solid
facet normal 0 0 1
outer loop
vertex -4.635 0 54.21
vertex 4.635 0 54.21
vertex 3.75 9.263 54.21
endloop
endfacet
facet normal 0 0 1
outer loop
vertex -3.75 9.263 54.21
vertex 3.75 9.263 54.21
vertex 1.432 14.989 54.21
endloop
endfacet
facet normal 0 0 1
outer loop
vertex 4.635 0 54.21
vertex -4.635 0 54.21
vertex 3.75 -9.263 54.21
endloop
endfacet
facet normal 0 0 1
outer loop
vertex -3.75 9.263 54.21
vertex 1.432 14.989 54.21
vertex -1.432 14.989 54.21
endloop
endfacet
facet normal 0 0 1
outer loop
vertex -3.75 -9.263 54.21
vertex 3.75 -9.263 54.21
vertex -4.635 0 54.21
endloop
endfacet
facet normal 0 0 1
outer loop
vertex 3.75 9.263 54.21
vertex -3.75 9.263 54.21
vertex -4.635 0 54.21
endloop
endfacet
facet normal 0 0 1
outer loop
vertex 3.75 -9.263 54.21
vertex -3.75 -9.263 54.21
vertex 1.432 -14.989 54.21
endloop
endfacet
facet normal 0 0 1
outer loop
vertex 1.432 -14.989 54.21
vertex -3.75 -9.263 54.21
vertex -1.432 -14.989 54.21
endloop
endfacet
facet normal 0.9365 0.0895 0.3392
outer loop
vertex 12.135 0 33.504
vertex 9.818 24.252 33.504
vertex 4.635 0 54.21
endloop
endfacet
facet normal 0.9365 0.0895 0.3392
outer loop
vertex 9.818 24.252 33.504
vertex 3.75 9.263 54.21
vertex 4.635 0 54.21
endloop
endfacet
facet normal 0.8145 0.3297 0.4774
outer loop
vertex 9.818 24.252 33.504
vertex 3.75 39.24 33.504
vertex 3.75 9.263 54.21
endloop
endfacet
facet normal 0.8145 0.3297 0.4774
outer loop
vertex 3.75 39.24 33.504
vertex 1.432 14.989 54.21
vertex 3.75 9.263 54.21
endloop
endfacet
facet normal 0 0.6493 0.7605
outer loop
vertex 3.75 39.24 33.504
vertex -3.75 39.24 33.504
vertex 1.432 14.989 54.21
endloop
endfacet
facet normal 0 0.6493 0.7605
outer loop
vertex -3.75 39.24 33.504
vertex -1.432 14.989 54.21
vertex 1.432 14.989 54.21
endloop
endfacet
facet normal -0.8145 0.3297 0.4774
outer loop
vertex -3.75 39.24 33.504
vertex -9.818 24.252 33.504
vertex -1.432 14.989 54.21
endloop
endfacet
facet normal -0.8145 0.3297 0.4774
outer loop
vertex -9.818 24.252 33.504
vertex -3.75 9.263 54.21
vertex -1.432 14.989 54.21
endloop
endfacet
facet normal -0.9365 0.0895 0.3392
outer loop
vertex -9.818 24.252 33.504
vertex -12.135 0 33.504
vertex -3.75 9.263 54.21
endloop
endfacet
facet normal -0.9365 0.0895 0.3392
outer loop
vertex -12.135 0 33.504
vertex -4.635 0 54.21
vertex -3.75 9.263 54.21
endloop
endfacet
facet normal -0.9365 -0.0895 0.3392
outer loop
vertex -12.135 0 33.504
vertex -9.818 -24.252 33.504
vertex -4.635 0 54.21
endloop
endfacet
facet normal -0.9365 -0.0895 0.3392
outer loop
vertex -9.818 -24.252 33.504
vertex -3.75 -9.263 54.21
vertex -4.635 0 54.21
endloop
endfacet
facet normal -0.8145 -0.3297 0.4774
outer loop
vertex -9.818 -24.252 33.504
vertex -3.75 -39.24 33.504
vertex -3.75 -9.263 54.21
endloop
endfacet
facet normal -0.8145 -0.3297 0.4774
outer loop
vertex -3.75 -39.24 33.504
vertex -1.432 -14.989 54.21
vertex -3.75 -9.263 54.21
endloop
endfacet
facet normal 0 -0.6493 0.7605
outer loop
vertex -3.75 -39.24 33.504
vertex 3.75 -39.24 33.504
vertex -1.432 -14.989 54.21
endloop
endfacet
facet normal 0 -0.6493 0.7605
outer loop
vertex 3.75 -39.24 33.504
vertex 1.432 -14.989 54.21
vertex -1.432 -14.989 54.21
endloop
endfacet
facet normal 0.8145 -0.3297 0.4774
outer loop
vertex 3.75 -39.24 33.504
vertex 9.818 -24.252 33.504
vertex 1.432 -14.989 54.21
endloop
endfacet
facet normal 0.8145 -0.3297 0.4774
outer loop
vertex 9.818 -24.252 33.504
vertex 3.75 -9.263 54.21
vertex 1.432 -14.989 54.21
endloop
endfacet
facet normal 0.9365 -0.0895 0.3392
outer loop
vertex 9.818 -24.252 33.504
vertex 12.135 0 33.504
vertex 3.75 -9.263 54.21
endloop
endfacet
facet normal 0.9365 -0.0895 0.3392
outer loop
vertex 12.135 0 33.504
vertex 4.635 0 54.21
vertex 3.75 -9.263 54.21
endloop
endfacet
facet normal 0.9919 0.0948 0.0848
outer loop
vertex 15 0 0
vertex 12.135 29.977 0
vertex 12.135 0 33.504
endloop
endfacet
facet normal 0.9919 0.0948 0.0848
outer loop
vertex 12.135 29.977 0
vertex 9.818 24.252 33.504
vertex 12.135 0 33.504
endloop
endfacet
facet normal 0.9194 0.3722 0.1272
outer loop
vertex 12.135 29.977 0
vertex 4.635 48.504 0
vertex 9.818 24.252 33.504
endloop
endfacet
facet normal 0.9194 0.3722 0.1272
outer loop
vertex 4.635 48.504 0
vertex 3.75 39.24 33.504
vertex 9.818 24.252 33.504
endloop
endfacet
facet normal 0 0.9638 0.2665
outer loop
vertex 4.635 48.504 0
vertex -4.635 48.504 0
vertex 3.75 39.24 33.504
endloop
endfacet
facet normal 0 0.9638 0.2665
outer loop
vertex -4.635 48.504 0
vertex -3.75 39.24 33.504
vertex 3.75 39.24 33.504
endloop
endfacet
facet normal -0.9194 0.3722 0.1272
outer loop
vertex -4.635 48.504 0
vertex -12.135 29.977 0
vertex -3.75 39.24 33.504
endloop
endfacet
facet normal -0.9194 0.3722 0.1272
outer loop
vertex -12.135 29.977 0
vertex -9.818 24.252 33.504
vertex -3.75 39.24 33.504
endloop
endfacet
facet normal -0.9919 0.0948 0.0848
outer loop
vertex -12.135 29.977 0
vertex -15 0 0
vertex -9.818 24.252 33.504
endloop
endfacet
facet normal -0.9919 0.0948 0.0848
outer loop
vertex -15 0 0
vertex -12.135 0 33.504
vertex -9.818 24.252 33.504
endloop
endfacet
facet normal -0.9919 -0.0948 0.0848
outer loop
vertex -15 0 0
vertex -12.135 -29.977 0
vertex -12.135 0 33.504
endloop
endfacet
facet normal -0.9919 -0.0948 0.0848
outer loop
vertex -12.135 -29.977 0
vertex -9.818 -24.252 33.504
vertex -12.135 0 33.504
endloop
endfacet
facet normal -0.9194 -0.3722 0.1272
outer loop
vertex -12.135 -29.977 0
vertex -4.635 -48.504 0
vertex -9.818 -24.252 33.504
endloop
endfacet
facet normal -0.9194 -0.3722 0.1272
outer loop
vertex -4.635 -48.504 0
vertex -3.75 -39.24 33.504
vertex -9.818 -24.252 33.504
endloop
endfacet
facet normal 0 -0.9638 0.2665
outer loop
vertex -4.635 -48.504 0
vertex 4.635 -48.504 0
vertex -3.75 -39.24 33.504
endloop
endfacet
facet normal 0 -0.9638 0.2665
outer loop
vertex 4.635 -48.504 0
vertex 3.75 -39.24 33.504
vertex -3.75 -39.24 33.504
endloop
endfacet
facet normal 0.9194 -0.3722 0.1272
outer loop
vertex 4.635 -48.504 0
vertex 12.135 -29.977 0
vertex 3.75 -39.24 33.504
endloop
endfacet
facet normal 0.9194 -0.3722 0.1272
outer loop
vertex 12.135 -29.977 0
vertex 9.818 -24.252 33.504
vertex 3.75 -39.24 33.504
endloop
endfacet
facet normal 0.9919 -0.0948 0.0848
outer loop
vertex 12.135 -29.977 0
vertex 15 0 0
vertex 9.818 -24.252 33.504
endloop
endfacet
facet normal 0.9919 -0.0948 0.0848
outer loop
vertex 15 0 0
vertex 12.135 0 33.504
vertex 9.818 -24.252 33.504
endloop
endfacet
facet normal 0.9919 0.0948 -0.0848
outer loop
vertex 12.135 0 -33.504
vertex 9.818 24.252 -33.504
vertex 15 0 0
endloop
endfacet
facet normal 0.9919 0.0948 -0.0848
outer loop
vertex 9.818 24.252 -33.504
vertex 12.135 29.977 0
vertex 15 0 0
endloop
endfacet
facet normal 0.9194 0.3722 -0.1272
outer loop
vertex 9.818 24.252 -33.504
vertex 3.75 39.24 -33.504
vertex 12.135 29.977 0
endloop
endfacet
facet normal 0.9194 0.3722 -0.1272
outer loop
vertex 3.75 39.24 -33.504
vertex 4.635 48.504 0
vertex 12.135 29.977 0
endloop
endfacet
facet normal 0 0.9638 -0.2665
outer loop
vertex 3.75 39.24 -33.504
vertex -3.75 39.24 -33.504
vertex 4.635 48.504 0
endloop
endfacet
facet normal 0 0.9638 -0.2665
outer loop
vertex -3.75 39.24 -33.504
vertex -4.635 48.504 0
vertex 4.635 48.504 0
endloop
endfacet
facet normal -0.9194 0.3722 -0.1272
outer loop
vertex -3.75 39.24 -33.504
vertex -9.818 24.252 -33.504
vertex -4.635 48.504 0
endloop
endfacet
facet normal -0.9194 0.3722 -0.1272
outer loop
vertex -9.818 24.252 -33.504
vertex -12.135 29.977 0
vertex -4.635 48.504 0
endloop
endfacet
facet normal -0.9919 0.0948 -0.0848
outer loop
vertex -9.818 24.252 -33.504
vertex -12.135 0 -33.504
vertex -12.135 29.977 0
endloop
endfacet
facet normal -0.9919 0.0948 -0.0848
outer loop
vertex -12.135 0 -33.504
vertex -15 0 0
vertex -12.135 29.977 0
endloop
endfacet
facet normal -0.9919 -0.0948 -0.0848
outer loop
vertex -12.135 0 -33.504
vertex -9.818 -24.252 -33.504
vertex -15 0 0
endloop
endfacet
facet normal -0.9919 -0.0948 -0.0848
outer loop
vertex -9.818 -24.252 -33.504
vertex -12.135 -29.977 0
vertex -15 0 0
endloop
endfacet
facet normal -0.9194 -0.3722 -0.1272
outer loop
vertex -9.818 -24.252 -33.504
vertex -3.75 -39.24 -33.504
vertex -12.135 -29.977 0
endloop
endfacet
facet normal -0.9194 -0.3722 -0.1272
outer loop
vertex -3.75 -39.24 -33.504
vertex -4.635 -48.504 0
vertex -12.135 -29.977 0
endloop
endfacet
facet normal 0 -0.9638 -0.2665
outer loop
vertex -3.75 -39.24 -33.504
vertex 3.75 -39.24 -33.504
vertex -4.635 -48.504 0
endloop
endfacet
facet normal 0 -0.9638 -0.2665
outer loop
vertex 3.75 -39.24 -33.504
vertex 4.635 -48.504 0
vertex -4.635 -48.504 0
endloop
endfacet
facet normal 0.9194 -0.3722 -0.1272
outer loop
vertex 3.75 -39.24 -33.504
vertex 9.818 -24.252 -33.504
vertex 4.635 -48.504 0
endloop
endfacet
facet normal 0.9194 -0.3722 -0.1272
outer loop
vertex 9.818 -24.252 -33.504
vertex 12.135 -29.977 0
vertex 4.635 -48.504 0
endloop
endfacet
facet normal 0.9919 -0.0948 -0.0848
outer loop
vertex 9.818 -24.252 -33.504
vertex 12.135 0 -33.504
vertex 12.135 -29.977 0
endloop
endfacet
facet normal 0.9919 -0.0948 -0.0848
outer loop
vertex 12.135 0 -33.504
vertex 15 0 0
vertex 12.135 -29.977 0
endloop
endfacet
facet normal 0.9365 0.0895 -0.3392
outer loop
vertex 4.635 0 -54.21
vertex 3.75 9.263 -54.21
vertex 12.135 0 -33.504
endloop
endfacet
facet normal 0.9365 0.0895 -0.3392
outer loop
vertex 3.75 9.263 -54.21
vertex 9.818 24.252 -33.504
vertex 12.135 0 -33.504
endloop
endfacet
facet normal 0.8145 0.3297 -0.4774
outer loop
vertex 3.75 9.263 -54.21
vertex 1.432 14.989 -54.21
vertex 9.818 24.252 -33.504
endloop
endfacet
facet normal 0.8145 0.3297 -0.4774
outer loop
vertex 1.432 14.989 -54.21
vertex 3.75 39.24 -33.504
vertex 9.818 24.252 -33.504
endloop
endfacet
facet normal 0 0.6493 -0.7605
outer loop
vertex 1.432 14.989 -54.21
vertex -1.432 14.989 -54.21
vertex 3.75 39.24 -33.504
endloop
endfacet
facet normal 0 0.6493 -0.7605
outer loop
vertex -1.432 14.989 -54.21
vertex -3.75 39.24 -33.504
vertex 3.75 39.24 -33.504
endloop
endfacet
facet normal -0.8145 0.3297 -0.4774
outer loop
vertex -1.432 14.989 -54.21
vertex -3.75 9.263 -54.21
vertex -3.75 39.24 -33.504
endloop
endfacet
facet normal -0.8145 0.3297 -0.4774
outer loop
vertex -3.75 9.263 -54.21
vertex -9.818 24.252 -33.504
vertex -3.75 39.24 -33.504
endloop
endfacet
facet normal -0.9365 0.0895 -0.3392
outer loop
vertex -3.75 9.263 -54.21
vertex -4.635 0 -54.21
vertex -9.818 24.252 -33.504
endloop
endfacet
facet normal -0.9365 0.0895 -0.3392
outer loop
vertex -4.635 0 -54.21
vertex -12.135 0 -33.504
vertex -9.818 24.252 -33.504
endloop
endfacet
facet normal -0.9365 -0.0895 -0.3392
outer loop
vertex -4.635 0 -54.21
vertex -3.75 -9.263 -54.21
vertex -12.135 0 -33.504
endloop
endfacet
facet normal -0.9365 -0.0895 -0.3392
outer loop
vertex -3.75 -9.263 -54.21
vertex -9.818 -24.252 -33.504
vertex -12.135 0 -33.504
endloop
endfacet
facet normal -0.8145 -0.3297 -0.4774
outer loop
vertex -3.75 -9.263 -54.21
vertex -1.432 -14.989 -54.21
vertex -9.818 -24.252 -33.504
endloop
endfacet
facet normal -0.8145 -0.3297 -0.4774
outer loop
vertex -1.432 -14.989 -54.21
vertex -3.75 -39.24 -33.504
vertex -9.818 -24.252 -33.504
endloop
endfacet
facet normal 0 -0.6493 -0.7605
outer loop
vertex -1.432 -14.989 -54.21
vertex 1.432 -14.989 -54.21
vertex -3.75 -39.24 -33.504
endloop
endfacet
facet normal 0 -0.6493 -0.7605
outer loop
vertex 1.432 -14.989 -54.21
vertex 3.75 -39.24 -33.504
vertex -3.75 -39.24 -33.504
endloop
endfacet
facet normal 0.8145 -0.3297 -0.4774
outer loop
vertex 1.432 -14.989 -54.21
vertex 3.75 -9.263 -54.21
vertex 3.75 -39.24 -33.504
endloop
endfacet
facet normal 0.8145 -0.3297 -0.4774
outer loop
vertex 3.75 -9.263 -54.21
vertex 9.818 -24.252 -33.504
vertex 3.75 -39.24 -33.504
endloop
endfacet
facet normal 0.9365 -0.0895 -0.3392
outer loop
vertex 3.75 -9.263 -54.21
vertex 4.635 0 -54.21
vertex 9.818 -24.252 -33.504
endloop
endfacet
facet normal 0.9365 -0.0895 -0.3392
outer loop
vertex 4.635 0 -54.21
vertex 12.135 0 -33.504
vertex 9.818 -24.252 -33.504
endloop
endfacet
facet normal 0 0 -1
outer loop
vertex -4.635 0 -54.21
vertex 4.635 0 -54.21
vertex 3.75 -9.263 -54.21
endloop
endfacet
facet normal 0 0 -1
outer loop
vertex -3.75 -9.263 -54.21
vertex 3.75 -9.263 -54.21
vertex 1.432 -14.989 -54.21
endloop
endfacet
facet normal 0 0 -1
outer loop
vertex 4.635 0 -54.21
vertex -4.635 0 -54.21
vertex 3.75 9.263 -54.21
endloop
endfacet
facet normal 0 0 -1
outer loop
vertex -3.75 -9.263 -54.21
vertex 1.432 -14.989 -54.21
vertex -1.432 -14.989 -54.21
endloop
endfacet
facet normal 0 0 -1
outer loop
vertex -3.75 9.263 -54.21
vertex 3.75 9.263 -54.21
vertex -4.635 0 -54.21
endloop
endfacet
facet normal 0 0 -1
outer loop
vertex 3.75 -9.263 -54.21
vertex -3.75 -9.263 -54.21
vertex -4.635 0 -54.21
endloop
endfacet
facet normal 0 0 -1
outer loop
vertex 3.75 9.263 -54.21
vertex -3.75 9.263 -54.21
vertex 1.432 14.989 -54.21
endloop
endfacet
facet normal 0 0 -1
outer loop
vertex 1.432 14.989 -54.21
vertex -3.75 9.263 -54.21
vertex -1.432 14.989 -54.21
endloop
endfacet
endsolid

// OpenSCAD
// Generated by SolidPython 1.0.1 on 2020-07-29 00:46:47


scale(v = [5, 17, 19]) {
	sphere(r = 3);
}
/***********************************************
*********      SolidPython code:      **********
************************************************
 
# import packages: SolidPython
from solid import *
from solid.utils import *
from itertools import chain, combinations, permutations


class Resize:

    def __init__(self, scad_file):
        self.scad_file = scad_file
        #self.scad_file = import_scad(scad_file)
        # cone/cylinder param:
        self.r1 = 0
        self.r2 = 0
        self.h = 0
        # rectangular prism param:
        self.w = 0
        self.l = 0
        # ellipse param:
        self.r = 0

    # import OpenScad code (file name corresponds to shape)


    # classify shape + parameters
    def assign(self, param1, param2, param3):
        if self.scad_file == 'cone.scad':
            self.r1 = param1
            self.r2 = param2
            self.h = param3
        elif self.scad_file == 'cylinder.scad':
            self.r1 = param1
            self.r2 = param2
            self.h = param3
        elif self.scad_file == 'rectangularPrism.scad':
            self.h = param1
            self.l = param2
            self.w = param3
        else:
            self.r = param1
            self.h = param2

    # resize parameters
    def iterate(self):
        x = range(3, 20, 2)
        i = 1
        if self.scad_file == 'cone.scad':
            tempList = list(permutations(x, 2))
            for temp in tempList:
                param1 = temp[0]
                param2 = temp[1]
                filepath = 'produced_scad_files/' + 'cone' + str(param1) + '_' + str(param2) + '_' + '.scad'
                scad_render_to_file(cylinder(h=param1, r1=param2, r2=0), filepath)

        elif self.scad_file == 'cylinder.scad':
            tempList = list(permutations(x, 3))
            for temp in tempList:
                param1 = temp[0]
                param2 = temp[1]
                filepath = 'produced_scad_files/' + 'cylinder' + str(param1) + '_' + str(param2) + '_' + '.scad'
                scad_render_to_file(cylinder(h=param1, r1=param2, r2=param2), filepath)

        elif self.scad_file == 'rectangularPrism.scad':
            tempList = list(permutations(x, 3))
            for temp in tempList:
                param1 = temp[0]
                param2 = temp[1]
                param3 = temp[2]
                filepath = 'produced_scad_files/' + 'rectangularPrism' + str(param1) + '_' + str(param2) + '_' + str(
                    param3) + '.scad'
                scad_render_to_file(cube(size=(param1, param2, param3)), filepath)

        elif self.scad_file == 'ellipse.scad':
            tempList = list(permutations(x, 4))
            for temp in tempList:
                param1 = temp[0]
                param2 = temp[1]
                param3 = temp[2]
                param4 = temp[3]
                filepath = 'produced_scad_files/' + 'ellipse' + str(param1) + '_' + str(param2) + '_' + str(param3) + '_' + str(param4) + '.scad'
                scad_render_to_file(scale([param1, param2, param3])(sphere(r=param4)), filepath)

    def render_to_scadfile(self):
        scad_render_to_file(scad, 'example.scad') 
 
************************************************/
